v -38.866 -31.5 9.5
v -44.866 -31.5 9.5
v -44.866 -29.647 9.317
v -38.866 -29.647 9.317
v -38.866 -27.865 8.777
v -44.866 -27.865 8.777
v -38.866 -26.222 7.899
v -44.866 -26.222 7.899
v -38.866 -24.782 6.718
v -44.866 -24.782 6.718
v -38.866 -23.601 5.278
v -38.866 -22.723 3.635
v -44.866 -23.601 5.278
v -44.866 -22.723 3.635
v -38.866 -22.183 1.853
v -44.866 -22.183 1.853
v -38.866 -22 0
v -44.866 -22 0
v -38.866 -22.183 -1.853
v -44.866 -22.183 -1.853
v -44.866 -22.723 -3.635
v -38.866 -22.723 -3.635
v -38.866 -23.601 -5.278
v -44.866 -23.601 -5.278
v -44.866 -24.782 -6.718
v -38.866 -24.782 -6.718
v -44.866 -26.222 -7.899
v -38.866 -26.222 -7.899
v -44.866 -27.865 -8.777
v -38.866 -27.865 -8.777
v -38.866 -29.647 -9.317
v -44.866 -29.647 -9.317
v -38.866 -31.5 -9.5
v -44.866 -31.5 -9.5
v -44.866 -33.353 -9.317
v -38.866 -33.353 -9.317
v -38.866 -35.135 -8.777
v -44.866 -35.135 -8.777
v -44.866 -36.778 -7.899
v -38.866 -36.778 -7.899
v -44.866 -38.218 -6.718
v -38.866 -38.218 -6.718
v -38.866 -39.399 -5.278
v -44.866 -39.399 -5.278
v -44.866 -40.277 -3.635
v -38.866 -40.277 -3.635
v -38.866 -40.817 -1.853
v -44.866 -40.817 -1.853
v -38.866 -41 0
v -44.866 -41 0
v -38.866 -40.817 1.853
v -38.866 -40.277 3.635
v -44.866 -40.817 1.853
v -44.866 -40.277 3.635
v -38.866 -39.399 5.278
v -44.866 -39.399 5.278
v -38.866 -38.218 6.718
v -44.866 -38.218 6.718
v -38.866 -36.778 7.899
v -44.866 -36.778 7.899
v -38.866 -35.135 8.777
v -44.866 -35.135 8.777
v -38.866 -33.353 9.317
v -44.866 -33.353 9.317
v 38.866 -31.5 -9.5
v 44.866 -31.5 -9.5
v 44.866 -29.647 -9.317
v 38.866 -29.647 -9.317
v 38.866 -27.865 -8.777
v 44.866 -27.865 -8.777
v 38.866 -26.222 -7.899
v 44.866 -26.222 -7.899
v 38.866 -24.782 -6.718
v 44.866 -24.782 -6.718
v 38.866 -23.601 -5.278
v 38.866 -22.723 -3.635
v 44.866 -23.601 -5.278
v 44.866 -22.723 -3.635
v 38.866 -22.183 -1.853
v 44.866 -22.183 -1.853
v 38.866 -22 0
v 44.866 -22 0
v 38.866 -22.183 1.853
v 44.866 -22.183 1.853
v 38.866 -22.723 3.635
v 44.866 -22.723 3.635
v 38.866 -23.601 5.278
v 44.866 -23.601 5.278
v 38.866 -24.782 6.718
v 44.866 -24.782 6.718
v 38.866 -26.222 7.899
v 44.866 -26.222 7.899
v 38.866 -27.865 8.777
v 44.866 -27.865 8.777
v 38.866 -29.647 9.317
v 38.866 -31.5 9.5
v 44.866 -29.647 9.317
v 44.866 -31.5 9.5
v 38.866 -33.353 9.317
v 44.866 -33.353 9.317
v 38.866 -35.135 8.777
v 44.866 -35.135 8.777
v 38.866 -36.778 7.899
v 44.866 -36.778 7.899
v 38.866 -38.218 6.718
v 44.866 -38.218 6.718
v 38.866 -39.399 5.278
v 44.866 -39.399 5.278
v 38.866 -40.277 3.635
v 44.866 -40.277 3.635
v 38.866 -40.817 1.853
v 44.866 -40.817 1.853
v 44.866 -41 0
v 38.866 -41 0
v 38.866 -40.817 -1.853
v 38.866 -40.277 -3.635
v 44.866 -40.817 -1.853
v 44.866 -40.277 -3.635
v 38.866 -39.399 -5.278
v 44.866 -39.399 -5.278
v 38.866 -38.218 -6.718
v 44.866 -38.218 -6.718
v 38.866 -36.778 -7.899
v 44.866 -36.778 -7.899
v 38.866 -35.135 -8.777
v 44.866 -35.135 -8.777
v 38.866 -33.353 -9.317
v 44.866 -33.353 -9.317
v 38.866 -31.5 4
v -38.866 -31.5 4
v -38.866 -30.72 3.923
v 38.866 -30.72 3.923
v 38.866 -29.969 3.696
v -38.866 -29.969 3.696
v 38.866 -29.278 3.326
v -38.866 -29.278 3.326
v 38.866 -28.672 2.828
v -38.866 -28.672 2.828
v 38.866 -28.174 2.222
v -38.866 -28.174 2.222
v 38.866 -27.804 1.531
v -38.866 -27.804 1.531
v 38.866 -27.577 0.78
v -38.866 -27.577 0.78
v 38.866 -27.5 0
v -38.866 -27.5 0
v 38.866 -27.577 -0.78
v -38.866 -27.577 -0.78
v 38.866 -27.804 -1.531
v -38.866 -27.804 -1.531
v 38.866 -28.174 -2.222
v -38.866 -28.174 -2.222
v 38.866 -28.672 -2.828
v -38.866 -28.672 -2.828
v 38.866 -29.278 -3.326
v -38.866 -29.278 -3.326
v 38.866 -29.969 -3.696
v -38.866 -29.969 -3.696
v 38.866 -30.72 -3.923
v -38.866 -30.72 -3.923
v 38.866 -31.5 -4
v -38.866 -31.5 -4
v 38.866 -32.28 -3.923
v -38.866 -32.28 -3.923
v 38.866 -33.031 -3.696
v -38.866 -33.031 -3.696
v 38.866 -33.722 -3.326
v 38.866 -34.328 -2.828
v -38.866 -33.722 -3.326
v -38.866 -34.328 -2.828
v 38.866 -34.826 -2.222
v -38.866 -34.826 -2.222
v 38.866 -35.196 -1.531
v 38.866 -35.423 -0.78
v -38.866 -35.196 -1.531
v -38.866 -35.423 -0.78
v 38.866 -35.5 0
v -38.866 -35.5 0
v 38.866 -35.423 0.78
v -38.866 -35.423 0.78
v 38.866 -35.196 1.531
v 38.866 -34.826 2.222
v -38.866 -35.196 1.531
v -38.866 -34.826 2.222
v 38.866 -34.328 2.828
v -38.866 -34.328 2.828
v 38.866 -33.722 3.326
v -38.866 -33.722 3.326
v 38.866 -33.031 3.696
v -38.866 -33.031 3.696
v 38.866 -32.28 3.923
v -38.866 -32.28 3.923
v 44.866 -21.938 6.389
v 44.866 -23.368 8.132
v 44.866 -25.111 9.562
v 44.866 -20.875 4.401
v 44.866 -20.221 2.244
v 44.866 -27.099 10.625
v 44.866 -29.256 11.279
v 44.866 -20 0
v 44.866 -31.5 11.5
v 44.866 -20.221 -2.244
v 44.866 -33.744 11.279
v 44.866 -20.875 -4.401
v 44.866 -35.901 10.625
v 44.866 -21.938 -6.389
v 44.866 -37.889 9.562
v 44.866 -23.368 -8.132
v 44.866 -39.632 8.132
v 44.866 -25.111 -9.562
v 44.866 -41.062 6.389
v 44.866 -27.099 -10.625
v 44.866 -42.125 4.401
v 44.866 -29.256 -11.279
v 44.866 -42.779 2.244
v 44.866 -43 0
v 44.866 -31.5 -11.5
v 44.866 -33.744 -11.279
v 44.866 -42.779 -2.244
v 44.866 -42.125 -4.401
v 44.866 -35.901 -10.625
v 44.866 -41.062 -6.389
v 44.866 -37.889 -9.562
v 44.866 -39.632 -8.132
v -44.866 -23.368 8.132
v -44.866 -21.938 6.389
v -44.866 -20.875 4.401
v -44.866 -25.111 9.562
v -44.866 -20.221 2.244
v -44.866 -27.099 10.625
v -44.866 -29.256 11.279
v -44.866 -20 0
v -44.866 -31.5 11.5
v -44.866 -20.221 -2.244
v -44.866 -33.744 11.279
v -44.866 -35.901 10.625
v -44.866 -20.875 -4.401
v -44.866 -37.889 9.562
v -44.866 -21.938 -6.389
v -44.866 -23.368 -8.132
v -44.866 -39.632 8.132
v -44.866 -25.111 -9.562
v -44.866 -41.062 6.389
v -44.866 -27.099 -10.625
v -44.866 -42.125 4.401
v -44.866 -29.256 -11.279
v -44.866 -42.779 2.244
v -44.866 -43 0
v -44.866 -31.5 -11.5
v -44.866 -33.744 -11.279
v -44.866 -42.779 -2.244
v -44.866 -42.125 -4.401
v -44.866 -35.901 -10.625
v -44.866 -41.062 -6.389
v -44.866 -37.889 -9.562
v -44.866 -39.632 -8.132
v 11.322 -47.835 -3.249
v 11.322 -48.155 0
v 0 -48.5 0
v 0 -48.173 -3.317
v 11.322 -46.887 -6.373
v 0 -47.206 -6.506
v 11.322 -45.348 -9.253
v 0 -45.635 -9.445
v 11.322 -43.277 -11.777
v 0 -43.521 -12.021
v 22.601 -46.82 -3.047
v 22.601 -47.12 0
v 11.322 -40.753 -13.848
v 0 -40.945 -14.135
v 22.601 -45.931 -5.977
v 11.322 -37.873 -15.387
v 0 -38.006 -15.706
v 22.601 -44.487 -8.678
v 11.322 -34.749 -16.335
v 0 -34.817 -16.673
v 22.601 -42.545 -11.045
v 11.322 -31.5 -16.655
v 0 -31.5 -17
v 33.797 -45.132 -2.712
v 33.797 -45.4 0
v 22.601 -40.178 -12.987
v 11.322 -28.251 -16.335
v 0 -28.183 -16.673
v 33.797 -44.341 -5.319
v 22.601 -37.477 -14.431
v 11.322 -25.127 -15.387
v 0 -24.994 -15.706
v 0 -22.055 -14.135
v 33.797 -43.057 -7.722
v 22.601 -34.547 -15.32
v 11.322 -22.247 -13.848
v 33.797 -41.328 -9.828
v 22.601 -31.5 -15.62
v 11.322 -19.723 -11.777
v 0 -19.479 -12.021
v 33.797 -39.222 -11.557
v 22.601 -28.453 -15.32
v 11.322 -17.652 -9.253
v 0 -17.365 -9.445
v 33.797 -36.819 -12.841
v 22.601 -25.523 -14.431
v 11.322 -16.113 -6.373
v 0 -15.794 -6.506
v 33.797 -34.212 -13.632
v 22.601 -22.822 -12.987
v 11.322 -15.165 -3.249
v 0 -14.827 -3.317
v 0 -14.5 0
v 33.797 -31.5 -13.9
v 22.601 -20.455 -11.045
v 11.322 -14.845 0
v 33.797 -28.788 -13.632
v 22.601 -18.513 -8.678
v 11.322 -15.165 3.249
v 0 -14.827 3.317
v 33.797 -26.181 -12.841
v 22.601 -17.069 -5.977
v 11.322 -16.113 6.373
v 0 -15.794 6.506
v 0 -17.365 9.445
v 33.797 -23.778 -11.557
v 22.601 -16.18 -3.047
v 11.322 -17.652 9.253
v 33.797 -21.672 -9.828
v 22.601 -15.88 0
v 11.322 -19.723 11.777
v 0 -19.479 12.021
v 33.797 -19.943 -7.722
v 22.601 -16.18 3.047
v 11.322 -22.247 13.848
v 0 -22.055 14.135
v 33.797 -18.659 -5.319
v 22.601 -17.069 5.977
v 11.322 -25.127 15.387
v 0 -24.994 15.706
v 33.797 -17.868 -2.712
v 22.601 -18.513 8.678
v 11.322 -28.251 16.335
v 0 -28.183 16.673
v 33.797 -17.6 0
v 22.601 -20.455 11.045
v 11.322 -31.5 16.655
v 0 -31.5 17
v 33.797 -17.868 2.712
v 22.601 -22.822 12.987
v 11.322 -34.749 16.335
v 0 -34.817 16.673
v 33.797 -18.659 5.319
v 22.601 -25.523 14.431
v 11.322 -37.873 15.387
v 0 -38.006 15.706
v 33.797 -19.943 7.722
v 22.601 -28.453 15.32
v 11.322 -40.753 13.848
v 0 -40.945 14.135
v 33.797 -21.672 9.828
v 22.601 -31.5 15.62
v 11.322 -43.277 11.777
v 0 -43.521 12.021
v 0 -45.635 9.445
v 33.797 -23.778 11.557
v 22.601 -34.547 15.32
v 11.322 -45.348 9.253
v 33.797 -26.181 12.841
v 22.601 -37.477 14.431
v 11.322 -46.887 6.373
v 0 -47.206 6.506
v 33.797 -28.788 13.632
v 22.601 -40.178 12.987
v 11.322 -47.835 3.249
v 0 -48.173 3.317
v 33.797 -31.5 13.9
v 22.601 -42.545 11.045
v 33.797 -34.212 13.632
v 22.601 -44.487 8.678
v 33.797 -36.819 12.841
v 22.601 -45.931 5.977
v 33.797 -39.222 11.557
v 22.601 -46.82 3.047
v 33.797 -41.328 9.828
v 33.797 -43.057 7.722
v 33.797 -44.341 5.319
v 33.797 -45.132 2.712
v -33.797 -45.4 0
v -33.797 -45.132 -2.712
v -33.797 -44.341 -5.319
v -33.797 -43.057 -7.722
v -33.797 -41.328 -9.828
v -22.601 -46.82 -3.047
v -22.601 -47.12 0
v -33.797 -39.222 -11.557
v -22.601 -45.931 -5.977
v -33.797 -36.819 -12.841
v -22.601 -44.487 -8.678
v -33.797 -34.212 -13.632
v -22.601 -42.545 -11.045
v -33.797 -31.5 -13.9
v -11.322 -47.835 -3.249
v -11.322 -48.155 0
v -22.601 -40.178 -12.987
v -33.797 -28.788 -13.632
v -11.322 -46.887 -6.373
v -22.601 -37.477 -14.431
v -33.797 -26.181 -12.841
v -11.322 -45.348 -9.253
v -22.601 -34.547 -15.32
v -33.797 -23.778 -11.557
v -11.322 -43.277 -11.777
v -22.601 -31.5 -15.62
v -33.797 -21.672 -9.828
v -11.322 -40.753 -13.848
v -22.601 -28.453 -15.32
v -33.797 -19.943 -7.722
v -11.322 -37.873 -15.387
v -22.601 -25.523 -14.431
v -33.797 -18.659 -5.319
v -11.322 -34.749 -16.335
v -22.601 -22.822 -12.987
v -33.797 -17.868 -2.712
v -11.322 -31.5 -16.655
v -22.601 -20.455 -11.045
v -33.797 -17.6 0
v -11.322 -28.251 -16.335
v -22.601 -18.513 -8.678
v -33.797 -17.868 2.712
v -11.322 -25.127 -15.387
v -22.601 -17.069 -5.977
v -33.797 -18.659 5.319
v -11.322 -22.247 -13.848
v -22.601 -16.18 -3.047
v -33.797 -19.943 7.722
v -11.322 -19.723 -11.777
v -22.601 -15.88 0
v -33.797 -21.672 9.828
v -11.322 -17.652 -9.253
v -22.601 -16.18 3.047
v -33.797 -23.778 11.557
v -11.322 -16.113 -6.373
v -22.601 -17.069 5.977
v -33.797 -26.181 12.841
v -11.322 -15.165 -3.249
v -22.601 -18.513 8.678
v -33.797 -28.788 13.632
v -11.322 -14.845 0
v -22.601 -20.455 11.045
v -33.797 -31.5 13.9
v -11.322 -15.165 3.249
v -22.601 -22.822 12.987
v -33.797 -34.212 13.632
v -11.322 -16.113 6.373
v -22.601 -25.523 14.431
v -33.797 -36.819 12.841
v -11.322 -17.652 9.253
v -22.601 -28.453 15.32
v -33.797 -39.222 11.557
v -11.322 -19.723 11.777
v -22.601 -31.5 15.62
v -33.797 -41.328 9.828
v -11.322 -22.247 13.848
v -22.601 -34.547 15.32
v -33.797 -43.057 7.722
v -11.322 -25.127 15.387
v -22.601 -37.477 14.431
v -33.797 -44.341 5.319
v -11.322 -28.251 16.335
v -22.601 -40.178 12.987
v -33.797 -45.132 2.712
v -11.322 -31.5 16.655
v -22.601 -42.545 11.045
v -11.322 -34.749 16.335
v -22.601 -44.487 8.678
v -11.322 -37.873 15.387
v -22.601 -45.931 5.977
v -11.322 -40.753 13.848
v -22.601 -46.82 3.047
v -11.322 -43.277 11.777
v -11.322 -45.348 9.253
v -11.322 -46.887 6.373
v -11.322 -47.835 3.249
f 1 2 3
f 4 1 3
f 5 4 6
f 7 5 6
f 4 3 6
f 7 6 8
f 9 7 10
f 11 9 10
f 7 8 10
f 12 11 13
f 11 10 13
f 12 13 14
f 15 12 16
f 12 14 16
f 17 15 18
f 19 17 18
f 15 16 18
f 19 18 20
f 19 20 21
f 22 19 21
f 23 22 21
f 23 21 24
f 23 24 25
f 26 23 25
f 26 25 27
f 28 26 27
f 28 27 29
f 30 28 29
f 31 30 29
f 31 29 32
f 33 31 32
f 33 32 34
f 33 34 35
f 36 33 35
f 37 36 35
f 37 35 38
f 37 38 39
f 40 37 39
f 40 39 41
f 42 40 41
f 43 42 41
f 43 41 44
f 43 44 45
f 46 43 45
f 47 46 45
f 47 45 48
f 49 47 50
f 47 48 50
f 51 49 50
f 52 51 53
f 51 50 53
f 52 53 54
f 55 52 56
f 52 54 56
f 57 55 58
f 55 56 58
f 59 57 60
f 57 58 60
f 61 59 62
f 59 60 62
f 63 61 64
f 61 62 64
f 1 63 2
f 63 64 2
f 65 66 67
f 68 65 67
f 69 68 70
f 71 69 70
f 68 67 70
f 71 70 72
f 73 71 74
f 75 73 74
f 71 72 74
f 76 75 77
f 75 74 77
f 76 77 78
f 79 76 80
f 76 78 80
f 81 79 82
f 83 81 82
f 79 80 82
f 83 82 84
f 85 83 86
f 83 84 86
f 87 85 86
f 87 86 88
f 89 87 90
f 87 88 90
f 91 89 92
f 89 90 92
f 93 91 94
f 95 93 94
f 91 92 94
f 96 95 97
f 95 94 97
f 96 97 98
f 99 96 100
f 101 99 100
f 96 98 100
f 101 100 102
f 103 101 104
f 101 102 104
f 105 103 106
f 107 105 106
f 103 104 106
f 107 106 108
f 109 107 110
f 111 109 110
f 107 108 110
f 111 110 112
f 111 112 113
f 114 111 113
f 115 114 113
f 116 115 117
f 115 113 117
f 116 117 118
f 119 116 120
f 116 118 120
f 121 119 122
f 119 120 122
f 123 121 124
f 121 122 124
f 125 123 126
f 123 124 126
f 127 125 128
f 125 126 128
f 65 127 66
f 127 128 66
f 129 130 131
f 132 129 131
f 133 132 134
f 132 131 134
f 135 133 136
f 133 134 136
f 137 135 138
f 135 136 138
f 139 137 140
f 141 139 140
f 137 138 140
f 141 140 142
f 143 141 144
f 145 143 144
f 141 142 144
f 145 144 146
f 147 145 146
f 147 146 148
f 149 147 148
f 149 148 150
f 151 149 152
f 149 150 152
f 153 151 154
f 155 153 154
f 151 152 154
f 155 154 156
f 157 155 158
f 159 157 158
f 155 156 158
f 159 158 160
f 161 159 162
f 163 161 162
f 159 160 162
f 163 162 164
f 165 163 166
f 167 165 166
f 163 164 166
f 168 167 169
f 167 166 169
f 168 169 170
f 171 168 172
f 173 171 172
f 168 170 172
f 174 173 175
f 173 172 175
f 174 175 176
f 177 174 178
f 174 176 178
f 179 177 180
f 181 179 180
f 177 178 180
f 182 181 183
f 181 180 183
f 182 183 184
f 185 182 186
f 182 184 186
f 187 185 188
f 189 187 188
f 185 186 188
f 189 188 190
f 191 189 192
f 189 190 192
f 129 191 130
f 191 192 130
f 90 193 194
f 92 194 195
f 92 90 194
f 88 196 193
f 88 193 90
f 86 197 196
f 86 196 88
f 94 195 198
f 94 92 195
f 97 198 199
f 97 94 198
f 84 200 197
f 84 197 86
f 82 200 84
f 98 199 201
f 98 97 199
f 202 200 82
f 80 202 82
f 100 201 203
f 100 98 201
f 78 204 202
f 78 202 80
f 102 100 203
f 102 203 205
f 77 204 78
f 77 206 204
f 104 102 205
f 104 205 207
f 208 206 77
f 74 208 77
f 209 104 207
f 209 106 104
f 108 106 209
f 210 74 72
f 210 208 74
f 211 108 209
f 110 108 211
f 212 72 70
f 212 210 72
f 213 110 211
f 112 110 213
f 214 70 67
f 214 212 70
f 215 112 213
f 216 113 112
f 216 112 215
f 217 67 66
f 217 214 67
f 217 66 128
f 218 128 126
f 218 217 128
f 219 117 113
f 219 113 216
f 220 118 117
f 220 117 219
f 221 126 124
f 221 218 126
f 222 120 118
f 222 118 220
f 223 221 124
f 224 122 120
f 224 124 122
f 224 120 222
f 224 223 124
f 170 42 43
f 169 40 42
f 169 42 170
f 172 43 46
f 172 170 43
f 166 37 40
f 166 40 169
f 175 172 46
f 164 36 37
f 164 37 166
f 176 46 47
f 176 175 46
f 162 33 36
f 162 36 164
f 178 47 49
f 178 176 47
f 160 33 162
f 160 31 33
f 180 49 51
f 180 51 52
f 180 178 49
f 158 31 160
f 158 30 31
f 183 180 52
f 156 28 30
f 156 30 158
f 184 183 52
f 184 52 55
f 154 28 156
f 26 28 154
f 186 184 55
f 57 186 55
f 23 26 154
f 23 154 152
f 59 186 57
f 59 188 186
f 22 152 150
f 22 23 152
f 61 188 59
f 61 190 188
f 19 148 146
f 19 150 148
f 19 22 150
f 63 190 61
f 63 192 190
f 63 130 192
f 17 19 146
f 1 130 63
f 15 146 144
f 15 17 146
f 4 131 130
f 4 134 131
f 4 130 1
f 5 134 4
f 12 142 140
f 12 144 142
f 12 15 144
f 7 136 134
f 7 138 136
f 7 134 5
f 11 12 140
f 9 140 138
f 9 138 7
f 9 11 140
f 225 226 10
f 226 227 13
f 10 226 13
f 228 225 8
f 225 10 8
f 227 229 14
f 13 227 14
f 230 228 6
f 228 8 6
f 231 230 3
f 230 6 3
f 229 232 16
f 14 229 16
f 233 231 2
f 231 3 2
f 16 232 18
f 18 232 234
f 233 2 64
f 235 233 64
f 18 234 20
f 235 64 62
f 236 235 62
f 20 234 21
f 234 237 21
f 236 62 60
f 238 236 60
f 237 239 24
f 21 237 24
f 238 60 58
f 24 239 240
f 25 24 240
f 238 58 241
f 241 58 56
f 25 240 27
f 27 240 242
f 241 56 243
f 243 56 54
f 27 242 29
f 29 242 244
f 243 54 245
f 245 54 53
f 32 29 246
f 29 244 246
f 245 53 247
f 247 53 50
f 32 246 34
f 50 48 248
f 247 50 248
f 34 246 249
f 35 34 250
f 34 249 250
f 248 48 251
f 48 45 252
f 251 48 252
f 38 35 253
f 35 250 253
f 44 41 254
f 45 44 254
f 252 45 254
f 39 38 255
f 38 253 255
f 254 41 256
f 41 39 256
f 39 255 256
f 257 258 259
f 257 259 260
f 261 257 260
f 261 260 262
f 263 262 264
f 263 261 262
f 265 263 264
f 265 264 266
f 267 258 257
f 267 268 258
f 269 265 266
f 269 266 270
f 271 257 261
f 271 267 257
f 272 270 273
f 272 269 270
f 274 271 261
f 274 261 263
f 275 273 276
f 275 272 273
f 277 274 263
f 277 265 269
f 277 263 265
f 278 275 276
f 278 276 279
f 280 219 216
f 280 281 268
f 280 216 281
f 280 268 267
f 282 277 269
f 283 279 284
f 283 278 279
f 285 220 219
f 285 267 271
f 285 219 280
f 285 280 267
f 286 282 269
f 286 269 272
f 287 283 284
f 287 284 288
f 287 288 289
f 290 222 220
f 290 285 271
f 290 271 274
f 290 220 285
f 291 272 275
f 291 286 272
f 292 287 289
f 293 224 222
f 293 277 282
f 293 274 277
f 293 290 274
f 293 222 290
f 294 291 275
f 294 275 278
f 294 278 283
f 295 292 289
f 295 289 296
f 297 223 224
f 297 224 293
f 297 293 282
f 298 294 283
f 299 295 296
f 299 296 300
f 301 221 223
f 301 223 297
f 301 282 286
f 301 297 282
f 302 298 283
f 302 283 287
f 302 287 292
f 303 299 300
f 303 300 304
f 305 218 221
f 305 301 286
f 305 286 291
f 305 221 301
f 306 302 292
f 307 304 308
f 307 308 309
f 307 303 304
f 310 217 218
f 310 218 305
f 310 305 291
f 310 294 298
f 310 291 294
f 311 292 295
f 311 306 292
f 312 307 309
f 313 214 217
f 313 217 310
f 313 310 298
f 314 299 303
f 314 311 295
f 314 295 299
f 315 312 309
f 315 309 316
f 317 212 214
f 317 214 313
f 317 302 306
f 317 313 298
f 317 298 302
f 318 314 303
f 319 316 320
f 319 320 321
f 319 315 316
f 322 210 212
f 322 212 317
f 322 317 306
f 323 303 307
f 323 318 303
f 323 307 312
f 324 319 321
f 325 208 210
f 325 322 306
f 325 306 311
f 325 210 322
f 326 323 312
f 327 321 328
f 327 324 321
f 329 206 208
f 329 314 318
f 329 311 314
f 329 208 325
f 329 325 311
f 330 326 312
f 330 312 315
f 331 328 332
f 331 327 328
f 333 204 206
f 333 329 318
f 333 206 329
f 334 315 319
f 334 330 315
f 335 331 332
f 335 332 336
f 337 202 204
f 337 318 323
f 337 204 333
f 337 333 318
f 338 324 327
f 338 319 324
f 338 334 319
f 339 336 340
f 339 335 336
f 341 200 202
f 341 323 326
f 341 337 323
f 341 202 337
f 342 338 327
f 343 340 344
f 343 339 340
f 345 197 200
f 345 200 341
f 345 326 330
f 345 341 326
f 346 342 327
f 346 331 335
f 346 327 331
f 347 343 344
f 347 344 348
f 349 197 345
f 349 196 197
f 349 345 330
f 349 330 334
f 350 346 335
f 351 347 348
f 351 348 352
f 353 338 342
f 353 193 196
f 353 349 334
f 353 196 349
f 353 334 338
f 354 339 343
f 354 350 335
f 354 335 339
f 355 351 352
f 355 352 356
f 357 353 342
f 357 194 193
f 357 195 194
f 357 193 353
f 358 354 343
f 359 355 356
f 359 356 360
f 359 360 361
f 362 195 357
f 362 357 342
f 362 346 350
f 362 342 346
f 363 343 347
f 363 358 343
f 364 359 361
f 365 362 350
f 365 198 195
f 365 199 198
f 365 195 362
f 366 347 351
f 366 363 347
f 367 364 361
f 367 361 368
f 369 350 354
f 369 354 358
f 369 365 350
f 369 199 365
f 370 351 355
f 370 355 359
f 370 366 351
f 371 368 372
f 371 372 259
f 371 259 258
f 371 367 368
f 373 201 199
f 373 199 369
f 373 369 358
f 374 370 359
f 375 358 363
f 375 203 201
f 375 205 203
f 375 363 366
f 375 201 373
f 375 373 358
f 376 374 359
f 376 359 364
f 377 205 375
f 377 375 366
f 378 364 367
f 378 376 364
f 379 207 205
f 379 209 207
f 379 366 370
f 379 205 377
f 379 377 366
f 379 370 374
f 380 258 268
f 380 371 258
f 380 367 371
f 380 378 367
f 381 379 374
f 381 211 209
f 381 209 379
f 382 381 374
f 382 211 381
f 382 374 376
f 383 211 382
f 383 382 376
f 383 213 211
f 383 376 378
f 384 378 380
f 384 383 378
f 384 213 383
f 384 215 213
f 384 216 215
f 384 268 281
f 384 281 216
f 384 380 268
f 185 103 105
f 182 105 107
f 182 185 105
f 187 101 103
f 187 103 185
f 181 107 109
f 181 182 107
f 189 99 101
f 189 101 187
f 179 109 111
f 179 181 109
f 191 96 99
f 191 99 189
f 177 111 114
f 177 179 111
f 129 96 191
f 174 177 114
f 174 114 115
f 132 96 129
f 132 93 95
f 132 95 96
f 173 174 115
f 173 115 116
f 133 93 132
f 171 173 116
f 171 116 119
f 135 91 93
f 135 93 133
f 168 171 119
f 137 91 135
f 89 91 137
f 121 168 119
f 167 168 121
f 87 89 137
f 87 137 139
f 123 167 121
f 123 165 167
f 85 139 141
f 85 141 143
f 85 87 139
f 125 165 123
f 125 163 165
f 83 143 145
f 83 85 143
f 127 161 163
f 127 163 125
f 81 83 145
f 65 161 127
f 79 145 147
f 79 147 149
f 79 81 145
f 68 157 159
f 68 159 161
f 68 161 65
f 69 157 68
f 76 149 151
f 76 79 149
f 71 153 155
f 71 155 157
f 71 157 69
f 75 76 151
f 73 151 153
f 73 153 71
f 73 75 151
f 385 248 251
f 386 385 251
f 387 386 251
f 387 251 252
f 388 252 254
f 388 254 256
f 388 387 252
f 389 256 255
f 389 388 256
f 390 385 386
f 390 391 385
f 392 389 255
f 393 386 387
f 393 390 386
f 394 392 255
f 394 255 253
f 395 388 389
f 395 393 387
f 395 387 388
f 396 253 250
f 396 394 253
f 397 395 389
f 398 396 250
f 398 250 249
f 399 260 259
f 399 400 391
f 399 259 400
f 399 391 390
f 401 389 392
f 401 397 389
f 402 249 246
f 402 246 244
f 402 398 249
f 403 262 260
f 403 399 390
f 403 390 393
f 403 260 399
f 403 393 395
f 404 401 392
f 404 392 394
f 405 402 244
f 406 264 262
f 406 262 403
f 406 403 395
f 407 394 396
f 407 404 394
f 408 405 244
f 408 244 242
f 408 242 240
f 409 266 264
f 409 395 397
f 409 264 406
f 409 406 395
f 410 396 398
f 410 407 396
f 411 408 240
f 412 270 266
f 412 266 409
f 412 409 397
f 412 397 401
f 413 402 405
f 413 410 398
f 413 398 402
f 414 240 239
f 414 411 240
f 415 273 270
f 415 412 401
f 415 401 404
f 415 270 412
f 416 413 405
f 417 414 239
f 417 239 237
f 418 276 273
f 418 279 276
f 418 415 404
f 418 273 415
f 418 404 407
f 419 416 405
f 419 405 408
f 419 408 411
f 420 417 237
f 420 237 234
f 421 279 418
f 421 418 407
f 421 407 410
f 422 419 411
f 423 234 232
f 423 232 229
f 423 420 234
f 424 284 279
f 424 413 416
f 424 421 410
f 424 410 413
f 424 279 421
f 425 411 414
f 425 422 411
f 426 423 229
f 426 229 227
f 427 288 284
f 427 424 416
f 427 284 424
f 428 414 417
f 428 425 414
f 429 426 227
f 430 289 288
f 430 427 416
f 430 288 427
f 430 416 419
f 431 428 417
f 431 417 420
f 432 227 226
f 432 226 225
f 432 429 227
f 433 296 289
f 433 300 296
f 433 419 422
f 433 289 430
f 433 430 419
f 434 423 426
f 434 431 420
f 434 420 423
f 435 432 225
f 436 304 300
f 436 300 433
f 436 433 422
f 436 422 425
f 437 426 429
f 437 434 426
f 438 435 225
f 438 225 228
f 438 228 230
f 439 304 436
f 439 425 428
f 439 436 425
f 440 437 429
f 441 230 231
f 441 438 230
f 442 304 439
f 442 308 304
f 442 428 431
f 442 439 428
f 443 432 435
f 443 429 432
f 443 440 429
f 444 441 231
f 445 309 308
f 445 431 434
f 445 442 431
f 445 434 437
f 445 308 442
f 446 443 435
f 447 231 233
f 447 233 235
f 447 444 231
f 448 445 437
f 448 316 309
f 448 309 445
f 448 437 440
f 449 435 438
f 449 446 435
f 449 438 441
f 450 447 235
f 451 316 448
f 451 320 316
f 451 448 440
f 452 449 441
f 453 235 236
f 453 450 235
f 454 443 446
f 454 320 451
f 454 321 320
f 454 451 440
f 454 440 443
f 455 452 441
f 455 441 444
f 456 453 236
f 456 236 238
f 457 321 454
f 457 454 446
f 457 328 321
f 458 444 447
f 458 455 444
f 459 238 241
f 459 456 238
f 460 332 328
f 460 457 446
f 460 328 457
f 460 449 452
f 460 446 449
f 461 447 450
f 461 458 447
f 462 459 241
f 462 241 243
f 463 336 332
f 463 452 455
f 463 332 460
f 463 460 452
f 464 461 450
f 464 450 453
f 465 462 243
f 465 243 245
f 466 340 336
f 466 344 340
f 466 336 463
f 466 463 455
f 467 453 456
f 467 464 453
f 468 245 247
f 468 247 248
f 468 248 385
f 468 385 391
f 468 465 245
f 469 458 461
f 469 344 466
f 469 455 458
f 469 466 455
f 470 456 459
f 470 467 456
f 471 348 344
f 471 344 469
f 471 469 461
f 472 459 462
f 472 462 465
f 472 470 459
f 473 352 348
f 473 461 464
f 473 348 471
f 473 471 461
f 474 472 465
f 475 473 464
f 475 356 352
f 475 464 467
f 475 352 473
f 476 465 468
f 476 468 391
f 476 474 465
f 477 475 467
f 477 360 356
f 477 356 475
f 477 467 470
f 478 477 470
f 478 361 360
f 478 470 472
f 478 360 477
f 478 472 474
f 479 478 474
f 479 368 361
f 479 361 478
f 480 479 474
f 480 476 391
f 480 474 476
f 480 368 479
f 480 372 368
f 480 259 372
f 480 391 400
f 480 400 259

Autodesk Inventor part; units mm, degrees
ref_plane "YZ Plane" through (0, 0, 0) normal (1, 0, 0) x (0, 1, 0)
ref_plane "XZ Plane" through (0, 0, 0) normal (0, 1, 0) x (-1, 0, 0)
ref_plane "Work Plane1" through (0, 0, 0) normal (0, -0.866, 0.5) x (1, 0, 0)
sketch "Sketch1" plane through (0, 0, 0) normal (0, -0.866, 0.5) x (1, 0, 0)
  circle A0 centre (0, 0) radius 97 construction
  dimension "d1" = 194
sketch "Sketch2" plane through (0, 0, 0) normal (0, 1, 0) x (-1, 0, 0)
  point P0 (0, 0)
sketch "Sketch3" plane through (0, 0, 0) normal (0, 0, 1) x (1, 0, 0)
  ellipse E0 centre (0, 0) end of major axis (97, 0) minor radius 48.5 construction
  circle A0 centre (0, -31.5) radius 17
  line L0 (0, -31.5) -> (44.8665, -31.5)
  line L1 (0, -43) -> (44.8665, -43) construction
  line L2 (0, -31.5) -> (-44.8665, -31.5)
  line L3 (0, -43) -> (-44.8665, -43) construction
  line L4 (44.8665, -43) -> (44.8665, -31.5)
  line L5 (-44.8665, -43) -> (-44.8665, -31.5)
  arc A1 (-44.8665, -43) -> (44.8665, -43) centre (0, 137.25) ccw
  dimension "d3" = 11.5
revolve "Revolution1" add sketch "Sketch3" angle 360 about axis through (0, -31.5, 0) along (1, 0, 0) picked at (1.261, -42.6913) contours L0 L4 A1 A0 | A0 L2 L0 | A0 A1 L5 L2
sketch "Sketch4" plane through (-44.8665, -31.5, 0) normal (-1, 0, 0) x (0, 0, 1)
  circle A0 centre (0, 0) radius 9.5
  point P0 (0, 31.5)
  dimension "d5" = 19
extrude "Extrusion1" cut sketch "Sketch4" against normal blind 6
sketch "Sketch5" plane through (-38.8665, -31.5, 0) normal (-1, 0, 0) x (0, 0, 1)
  circle A0 centre (0, 0) radius 4
  point P0 (0, 31.5)
  dimension "d8" = 8
extrude "Extrusion2" cut sketch "Sketch5" against normal blind 100
sketch "Sketch6" plane through (44.8665, -31.5, 0) normal (1, 0, 0) x (0, 0, -1)
  circle A0 centre (0, 0) radius 4 projected
  circle A1 centre (0, 0) radius 9.5
  point P0 (0, 31.5)
extrude "Extrusion3" cut sketch "Sketch6" against normal blind 6
properties part number "roller test"
